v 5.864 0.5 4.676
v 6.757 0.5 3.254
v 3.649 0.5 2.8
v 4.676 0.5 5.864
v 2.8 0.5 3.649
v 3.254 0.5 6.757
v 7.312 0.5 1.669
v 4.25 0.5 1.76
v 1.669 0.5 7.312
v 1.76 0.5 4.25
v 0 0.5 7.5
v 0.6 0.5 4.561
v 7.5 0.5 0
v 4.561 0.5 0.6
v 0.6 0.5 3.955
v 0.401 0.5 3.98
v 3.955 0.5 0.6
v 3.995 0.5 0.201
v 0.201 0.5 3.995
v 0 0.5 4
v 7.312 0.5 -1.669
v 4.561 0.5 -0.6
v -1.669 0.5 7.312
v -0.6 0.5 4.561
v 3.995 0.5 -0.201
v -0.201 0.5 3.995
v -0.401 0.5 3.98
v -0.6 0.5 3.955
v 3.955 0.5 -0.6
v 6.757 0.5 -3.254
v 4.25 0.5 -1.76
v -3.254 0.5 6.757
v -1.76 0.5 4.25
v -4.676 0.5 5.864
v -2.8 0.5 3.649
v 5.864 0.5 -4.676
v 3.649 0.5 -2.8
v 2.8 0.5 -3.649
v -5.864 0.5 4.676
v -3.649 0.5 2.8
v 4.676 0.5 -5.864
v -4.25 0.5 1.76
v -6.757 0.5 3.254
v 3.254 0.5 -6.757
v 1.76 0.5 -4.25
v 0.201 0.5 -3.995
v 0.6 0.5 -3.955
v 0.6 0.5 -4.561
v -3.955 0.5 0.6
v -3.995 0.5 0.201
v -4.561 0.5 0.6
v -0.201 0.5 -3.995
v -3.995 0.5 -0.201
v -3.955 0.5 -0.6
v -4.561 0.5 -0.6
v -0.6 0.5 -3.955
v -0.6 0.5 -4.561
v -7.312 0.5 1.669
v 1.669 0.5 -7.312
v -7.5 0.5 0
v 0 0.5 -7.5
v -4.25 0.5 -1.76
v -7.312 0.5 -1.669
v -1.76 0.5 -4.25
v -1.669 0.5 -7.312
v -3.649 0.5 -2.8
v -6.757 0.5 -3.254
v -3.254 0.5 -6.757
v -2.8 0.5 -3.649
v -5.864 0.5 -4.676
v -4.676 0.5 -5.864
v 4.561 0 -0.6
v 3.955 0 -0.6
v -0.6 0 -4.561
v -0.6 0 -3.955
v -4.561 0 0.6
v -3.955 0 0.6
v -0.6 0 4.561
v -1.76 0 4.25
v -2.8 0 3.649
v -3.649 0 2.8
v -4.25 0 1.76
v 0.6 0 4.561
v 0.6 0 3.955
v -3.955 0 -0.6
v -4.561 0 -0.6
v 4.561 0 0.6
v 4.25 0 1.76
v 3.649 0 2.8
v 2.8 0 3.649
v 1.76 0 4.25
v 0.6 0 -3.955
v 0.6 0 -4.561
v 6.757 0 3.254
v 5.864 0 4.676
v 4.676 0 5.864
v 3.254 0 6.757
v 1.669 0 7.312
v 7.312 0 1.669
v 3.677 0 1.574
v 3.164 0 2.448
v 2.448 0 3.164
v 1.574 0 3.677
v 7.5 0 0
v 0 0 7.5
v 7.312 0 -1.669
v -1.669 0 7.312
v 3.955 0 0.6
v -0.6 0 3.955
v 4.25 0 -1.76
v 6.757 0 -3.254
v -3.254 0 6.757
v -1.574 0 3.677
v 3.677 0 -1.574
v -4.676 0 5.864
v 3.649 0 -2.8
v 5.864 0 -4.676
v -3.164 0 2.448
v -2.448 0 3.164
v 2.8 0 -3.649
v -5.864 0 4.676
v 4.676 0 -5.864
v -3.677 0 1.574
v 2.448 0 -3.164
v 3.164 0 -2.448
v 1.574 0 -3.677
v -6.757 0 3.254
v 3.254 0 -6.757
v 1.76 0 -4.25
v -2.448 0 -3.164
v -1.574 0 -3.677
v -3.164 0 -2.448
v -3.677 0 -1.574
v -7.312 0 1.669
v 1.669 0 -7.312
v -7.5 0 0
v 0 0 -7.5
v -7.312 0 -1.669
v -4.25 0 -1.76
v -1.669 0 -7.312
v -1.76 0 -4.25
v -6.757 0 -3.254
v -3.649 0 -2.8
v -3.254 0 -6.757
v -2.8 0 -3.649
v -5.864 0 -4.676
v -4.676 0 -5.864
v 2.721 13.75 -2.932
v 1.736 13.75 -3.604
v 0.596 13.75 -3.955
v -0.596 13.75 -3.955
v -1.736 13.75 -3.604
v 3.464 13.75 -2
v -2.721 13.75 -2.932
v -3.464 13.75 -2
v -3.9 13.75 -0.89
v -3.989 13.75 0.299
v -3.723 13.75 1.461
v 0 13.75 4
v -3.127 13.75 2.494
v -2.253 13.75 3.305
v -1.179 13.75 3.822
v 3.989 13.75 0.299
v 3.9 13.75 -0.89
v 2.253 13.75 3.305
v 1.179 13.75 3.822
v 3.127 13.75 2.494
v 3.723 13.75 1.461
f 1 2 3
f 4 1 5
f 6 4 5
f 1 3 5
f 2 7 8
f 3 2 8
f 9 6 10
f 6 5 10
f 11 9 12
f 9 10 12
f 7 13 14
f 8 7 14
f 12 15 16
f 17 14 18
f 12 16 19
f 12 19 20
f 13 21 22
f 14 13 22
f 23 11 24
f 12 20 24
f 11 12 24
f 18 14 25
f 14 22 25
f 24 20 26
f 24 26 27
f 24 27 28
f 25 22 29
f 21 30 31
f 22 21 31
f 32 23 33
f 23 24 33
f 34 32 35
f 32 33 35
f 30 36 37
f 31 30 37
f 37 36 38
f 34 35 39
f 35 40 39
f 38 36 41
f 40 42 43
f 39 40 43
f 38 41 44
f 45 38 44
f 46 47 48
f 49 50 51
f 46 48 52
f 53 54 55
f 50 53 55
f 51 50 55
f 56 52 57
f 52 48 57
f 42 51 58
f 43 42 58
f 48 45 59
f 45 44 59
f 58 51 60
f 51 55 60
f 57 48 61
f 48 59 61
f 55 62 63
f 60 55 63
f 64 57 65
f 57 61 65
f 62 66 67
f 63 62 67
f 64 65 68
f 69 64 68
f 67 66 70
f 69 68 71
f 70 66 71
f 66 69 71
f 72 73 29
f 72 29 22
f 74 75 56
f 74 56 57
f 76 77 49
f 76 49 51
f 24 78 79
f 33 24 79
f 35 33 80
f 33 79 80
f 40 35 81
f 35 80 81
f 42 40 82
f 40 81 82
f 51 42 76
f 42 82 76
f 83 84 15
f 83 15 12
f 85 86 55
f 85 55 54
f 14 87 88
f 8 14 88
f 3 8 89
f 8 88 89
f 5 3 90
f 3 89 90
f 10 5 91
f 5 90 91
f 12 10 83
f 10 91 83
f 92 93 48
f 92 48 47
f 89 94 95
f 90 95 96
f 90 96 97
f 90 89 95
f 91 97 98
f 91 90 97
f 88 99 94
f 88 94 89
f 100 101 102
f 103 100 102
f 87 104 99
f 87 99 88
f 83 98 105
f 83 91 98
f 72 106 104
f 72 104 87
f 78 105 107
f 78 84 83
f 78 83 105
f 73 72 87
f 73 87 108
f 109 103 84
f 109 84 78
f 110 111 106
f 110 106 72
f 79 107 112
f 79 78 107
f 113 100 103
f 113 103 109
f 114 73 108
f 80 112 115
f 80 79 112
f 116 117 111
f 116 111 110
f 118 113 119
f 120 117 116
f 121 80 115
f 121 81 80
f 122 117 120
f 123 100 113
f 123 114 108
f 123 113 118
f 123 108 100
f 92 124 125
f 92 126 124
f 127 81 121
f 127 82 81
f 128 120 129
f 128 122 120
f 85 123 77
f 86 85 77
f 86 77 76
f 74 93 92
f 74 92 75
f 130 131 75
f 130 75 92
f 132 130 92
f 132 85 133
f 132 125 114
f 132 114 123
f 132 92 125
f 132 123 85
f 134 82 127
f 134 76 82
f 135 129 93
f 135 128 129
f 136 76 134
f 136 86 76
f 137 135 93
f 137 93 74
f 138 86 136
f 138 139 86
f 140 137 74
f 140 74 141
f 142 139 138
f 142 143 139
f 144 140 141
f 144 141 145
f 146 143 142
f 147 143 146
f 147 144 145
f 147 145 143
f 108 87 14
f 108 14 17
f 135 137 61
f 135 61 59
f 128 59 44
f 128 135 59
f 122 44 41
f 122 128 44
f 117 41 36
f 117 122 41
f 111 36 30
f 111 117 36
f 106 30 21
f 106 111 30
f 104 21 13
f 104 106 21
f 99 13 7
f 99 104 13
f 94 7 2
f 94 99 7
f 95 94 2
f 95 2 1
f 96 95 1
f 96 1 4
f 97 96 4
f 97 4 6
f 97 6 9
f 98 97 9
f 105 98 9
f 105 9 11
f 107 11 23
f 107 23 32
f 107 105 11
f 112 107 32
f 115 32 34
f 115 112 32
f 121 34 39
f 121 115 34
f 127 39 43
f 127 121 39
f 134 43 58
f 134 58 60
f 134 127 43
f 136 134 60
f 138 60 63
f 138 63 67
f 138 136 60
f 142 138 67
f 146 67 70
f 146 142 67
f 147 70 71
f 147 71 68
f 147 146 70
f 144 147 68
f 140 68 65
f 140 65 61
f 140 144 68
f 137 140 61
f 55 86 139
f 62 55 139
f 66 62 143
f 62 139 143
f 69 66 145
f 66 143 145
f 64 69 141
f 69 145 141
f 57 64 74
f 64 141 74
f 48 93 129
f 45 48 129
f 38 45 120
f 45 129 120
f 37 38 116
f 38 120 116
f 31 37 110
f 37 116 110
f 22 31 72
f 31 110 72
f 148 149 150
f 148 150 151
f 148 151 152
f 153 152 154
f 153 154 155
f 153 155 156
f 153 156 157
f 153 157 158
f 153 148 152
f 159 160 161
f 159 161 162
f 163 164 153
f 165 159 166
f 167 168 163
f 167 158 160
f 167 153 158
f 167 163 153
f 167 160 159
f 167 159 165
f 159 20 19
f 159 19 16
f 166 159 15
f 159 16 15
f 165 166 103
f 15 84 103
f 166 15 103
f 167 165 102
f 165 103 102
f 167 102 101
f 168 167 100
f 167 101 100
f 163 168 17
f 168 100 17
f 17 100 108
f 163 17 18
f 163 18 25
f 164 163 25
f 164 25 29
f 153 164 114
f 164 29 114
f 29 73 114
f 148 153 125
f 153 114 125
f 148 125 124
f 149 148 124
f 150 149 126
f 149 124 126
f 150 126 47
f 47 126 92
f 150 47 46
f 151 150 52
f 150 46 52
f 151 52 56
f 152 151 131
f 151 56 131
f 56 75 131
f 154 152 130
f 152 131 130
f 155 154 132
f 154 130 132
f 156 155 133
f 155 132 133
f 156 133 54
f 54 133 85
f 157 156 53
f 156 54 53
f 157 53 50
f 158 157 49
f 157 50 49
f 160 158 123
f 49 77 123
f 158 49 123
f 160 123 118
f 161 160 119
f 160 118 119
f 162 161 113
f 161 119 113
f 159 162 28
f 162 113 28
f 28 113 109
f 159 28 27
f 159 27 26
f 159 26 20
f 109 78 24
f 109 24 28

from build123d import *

# Parameters (mm, degrees)
SKETCH1_R           = 4
BOSS_EXTRUDE1_DEPTH = 13.75
SKETCH2_R           = 7.5
SKETCH2_R_2         = 4.6
BOSS_EXTRUDE2_DEPTH = 0.5
BOSS_EXTRUDE3_DEPTH = 0.5


with BuildPart() as part:
    # Sketch1 → Boss-Extrude1 (new body)
    with BuildSketch(Plane(origin=(0, 0, 0), x_dir=(1, 0, 0), z_dir=(0, 1, 0))):
        with Locations(Location((0, 0, 0), (0, 0, 270))):
            Circle(SKETCH1_R)
    extrude(amount=BOSS_EXTRUDE1_DEPTH)



with BuildPart() as body_2:
    # Sketch2 → Boss-Extrude2 (new body)
    with BuildSketch(Plane(origin=(0, 0, 0), x_dir=(-1, 0, 0), z_dir=(0, -1, 0))):
        with Locations(Location((0, 0, 0), (0, 0, 90))):
            Circle(SKETCH2_R)
        with Locations(Location((0, 0, 0), (0, 0, 90))):
            Circle(SKETCH2_R_2, mode=Mode.SUBTRACT)
    extrude(amount=-BOSS_EXTRUDE2_DEPTH)


with BuildPart() as part_1:
    add(part.part)

    add(body_2.part)  # Boss-Extrude3 merges body 2
    # Sketch3 → Boss-Extrude3 (add)
    with BuildSketch(Plane(origin=(0, 0, 0), x_dir=(-1, 0, 0), z_dir=(0, -1, 0))):
        with BuildLine():
            ThreePointArc((4.5607017, -0.6), (4.6, 0), (4.5607017, 0.6))
            Line((4.5607017, 0.6), (3.954743987, 0.6))
            ThreePointArc((3.954743987, 0.6), (4, 0), (3.954743987, -0.6))
            Line((3.954743987, -0.6), (4.5607017, -0.6))
        make_face()
        with BuildLine():
            Line((0.6, 3.954743987), (0.6, 4.5607017))
            ThreePointArc((0.6, 4.5607017), (0, 4.6), (-0.6, 4.5607017))
            Line((-0.6, 4.5607017), (-0.6, 3.954743987))
            ThreePointArc((-0.6, 3.954743987), (0, 4), (0.6, 3.954743987))
        make_face()
        with BuildLine():
            ThreePointArc((-0.6, -4.5607017), (0, -4.6), (0.6, -4.5607017))
            Line((0.6, -4.5607017), (0.6, -3.954743987))
            ThreePointArc((0.6, -3.954743987), (0, -4), (-0.6, -3.954743987))
            Line((-0.6, -3.954743987), (-0.6, -4.5607017))
        make_face()
        with BuildLine():
            Line((-3.954743987, 0.6), (-4.5607017, 0.6))
            ThreePointArc((-4.5607017, 0.6), (-4.6, 0), (-4.5607017, -0.6))
            Line((-4.5607017, -0.6), (-3.954743987, -0.6))
            ThreePointArc((-3.954743987, -0.6), (-4, 0), (-3.954743987, 0.6))
        make_face()
    extrude(amount=-BOSS_EXTRUDE3_DEPTH)


solid = part_1.part
